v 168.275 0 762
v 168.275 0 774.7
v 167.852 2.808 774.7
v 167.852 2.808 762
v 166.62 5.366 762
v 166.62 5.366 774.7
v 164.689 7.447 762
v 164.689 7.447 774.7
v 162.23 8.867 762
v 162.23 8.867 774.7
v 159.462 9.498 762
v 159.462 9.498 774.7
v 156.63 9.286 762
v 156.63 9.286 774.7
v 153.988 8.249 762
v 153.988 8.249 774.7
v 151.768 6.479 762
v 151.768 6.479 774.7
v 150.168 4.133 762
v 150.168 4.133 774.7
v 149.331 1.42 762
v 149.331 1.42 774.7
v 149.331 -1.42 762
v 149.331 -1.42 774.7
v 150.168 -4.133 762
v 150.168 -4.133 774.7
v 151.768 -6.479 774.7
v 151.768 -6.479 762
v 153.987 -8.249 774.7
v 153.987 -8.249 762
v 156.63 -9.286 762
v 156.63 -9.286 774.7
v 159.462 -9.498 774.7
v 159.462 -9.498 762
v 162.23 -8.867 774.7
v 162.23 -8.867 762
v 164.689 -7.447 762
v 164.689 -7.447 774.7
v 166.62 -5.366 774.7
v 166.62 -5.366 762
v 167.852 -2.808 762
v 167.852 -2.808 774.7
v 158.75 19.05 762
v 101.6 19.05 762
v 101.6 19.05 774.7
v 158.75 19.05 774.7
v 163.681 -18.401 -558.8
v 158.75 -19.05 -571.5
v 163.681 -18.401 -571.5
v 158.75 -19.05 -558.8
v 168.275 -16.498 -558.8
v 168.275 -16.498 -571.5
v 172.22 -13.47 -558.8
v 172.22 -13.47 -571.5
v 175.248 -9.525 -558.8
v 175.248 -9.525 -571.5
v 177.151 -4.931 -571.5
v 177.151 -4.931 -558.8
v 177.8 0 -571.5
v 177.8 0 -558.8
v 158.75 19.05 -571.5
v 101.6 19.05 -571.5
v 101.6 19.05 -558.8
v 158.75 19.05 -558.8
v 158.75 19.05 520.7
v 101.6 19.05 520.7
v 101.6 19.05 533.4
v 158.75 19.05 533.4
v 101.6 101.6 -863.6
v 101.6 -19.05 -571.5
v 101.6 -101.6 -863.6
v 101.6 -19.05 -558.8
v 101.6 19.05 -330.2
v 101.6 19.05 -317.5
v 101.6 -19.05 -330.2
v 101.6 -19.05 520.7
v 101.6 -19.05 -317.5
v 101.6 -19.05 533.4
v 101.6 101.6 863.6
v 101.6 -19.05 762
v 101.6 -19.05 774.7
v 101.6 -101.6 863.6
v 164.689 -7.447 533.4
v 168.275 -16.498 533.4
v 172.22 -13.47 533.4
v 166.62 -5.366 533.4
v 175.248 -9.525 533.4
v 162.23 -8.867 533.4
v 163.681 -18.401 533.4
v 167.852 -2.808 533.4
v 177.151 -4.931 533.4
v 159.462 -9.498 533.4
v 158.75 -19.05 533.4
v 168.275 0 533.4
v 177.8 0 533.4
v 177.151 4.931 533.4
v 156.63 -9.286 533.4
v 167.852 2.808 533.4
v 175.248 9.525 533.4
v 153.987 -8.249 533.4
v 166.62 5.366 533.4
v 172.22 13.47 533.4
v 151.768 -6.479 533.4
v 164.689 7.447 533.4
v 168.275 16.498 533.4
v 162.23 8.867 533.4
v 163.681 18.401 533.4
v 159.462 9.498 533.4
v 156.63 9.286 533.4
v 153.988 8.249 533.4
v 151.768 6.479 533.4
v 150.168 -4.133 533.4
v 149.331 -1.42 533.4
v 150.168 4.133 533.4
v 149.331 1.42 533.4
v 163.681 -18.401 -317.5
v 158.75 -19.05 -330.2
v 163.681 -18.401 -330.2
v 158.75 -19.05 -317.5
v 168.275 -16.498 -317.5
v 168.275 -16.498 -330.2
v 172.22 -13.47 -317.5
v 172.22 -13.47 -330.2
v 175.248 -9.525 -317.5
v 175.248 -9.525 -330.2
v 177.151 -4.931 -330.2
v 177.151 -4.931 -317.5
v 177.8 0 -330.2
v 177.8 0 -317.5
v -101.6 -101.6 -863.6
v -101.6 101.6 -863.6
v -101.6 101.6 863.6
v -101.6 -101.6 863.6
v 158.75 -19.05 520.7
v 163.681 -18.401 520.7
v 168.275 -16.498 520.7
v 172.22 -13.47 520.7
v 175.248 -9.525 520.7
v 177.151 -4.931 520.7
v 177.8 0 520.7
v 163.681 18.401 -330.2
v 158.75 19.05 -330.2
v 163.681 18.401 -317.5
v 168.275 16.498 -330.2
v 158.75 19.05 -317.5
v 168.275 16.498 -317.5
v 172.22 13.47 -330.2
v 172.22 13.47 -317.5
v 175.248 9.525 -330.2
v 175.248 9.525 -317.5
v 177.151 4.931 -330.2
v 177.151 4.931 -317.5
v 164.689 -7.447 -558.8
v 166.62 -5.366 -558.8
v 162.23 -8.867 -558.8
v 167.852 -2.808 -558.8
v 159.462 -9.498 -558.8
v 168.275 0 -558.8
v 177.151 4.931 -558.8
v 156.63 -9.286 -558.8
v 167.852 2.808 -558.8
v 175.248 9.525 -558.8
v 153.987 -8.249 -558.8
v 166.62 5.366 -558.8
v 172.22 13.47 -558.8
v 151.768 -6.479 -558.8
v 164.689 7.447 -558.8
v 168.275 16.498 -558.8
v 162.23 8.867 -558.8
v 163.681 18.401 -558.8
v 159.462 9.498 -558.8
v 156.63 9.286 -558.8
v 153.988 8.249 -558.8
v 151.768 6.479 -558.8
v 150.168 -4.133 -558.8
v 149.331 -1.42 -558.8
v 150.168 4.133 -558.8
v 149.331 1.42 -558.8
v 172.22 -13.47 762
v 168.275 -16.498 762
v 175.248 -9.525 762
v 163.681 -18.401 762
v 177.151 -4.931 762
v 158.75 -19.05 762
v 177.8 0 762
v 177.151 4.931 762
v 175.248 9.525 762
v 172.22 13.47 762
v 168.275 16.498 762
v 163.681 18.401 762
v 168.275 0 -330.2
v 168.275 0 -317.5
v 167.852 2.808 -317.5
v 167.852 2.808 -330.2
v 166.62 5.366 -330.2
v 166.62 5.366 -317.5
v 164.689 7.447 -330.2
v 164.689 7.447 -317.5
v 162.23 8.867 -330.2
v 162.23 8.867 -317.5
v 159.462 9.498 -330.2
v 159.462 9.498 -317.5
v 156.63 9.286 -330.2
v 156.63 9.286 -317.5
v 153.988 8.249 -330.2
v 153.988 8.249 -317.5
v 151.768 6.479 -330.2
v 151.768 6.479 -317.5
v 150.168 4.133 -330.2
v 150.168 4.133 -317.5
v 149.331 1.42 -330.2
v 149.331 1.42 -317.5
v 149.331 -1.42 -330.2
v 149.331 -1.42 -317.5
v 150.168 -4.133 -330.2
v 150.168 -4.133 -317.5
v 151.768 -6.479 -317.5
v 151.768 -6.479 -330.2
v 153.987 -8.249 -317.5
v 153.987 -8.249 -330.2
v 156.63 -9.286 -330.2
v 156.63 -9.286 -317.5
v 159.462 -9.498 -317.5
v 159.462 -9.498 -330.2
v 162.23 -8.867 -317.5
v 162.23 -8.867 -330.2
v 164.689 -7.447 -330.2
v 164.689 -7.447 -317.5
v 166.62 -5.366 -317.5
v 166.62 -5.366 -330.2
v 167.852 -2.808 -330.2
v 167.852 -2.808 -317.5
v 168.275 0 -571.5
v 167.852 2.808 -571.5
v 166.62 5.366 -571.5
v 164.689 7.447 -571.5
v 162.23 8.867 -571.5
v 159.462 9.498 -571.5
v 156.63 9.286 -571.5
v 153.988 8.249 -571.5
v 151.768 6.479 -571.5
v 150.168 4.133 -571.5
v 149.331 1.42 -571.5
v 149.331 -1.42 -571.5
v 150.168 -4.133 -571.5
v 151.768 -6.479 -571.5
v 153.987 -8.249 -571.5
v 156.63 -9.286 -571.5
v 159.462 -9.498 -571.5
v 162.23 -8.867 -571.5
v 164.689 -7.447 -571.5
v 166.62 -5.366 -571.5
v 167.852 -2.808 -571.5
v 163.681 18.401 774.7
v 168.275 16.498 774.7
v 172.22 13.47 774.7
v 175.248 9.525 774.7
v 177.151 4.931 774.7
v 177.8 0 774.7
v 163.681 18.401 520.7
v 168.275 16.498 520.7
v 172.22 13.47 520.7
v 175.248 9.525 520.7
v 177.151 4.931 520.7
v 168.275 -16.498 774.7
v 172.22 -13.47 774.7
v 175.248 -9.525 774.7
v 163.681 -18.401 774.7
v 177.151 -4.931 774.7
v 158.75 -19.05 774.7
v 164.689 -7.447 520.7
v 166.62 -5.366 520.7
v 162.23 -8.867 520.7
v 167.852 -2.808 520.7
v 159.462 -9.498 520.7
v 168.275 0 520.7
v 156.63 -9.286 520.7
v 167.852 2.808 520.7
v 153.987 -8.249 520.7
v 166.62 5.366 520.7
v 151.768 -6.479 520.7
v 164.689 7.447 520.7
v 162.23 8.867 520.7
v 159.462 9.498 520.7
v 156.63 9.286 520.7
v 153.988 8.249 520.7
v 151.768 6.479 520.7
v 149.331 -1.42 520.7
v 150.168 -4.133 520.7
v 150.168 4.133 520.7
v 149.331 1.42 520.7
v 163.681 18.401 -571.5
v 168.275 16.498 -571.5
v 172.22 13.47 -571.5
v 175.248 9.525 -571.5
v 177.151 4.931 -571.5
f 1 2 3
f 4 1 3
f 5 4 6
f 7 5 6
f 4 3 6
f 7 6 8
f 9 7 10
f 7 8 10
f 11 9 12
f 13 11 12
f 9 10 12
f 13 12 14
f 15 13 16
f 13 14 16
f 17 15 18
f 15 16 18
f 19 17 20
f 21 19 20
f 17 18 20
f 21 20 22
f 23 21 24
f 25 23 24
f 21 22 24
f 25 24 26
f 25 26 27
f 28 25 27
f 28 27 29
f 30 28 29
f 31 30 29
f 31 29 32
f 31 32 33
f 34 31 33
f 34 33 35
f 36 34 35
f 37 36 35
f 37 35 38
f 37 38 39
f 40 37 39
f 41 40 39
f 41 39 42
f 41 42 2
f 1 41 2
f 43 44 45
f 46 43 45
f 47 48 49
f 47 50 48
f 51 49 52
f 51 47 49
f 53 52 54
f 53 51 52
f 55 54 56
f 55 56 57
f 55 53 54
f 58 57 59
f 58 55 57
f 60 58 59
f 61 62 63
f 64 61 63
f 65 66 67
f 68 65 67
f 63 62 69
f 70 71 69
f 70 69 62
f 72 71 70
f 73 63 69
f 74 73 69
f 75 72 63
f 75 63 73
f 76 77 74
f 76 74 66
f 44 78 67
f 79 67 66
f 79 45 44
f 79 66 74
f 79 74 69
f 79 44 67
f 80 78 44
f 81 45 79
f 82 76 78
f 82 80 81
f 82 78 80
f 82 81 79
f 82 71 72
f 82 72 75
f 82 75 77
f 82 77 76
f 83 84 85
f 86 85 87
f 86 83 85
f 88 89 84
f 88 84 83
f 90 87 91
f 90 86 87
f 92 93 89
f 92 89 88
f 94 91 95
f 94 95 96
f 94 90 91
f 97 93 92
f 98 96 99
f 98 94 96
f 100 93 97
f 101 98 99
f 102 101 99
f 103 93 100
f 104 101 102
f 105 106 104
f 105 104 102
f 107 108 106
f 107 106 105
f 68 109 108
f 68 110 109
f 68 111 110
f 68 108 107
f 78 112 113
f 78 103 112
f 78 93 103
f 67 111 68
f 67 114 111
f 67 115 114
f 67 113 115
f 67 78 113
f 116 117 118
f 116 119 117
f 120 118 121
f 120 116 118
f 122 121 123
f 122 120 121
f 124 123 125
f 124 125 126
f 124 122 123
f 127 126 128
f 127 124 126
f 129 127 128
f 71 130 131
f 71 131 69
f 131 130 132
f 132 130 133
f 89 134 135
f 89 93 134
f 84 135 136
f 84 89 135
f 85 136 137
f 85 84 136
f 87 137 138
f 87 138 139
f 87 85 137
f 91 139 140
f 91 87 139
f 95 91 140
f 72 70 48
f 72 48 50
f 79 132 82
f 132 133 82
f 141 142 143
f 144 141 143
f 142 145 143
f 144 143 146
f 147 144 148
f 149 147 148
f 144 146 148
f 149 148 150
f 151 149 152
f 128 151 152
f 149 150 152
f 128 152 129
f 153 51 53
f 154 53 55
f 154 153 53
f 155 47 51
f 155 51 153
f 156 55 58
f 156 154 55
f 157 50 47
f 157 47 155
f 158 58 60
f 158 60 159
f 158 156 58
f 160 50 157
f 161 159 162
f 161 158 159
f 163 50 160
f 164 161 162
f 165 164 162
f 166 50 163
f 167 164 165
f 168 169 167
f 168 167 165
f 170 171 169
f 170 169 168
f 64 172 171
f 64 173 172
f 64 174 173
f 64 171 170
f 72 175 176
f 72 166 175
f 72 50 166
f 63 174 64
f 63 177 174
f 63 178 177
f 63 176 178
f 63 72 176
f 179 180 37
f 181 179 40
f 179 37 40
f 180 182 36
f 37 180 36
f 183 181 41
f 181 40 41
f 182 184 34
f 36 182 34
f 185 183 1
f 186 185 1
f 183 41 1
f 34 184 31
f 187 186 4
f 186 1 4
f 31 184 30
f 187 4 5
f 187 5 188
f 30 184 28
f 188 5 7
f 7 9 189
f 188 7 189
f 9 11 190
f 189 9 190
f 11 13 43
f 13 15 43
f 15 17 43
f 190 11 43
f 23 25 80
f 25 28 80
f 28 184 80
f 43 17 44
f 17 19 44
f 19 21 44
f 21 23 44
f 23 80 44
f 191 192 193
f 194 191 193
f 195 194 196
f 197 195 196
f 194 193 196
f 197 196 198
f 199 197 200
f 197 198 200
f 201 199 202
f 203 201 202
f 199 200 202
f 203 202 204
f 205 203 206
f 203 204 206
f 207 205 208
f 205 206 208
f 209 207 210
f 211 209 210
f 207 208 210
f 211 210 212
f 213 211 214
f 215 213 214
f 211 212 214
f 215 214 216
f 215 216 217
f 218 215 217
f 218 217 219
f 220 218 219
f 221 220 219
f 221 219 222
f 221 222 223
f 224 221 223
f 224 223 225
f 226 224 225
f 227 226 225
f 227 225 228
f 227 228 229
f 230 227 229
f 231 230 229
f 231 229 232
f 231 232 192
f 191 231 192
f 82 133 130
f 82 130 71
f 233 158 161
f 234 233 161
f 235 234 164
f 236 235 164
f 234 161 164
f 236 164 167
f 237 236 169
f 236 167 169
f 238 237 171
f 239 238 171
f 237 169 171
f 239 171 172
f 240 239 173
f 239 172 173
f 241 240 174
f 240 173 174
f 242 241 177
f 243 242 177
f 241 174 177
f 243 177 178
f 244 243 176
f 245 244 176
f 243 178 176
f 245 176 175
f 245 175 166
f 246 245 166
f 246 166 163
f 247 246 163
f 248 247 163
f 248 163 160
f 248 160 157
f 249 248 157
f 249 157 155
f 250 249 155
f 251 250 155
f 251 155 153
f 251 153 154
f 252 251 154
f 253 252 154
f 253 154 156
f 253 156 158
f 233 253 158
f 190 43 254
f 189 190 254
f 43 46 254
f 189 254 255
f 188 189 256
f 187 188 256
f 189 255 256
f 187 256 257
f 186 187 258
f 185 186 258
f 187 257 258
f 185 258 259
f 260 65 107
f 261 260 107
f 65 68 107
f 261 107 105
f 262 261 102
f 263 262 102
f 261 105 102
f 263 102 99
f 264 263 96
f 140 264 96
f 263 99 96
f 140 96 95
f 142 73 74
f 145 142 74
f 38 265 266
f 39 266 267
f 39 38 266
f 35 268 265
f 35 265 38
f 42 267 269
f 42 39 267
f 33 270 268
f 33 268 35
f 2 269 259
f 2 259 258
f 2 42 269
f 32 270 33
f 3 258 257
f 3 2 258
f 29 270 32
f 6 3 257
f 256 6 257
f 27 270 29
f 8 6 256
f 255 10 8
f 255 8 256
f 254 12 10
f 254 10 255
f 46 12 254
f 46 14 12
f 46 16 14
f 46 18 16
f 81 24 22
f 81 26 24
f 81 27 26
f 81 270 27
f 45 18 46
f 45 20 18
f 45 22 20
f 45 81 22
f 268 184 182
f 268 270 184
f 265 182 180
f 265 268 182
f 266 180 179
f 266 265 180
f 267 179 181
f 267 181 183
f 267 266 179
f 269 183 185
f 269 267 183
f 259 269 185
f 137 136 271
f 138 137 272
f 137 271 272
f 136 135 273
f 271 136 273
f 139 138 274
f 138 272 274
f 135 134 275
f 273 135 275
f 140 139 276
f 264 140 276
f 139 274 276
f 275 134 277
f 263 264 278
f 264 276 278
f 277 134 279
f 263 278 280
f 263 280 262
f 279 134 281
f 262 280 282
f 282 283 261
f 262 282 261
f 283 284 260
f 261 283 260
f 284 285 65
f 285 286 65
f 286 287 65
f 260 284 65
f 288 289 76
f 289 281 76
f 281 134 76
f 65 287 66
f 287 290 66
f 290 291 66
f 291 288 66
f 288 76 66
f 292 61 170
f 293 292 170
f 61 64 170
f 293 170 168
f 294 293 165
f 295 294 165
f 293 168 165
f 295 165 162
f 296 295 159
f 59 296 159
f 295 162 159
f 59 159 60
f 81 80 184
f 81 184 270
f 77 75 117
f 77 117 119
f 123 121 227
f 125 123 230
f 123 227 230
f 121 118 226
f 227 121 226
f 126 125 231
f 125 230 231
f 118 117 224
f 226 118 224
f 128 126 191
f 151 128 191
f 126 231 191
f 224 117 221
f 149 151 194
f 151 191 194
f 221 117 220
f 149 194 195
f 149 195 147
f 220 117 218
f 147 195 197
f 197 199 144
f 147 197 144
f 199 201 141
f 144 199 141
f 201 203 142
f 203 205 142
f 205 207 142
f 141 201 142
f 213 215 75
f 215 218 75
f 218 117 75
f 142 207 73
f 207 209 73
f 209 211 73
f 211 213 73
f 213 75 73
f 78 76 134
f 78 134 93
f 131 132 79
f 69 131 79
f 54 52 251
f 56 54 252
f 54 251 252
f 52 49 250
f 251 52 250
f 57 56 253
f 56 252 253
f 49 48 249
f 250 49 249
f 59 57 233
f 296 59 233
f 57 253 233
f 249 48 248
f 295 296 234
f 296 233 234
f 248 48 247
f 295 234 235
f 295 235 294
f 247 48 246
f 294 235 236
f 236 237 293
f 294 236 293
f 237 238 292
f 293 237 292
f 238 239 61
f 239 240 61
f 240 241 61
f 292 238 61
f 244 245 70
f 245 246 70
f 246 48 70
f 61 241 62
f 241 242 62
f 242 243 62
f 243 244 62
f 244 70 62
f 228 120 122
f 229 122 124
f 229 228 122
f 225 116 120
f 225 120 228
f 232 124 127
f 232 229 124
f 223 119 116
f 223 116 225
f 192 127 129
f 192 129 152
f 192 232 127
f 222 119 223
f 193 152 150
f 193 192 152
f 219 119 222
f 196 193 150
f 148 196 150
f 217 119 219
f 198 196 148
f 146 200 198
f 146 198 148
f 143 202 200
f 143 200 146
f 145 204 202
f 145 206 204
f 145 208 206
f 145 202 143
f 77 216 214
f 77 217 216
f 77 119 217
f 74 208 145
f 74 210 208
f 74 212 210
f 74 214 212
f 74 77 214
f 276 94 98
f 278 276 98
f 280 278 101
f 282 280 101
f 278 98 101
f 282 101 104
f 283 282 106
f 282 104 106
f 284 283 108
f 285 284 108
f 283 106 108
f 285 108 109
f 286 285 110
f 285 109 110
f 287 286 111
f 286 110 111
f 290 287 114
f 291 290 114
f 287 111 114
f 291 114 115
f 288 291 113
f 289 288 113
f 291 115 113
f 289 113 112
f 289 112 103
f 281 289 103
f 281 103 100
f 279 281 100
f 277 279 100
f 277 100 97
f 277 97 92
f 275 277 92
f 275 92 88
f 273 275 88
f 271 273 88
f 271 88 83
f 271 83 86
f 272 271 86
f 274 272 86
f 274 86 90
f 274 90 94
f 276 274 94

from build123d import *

# Parameters (mm, degrees)
F0_W     = 203.2
F0_H     = 1727.2
F1_DEPTH = 101.6
F2_W     = 38.1
F2_H     = 12.7
F3_DEPTH = 76.2
F4_R     = 19.04999
F5_R     = 9.525
F6_DEPTH = 1638.301


# Not quite as in the source:
# - a fillet or chamfer is up to 0.001 mm smaller than in the source, because OpenCascade refuses the exact size


with BuildPart() as f1:
    # F0 (on Front) → F1 (new body, symmetric)
    with BuildSketch(Plane.XZ):
        Rectangle(F0_W, F0_H)
    extrude(amount=F1_DEPTH, both=True)

    # F2 (on face) → F3 (join)
    with BuildSketch(Plane.YZ.offset(101.6)):
        with Locations((0, -565.15)):
            Rectangle(F2_W, F2_H)
        with Locations((0, -323.85)):
            Rectangle(F2_W, F2_H)
        with Locations((0, 527.05)):
            Rectangle(F2_W, F2_H)
        with Locations((0, 768.35)):
            Rectangle(F2_W, F2_H)
    extrude(amount=F3_DEPTH)

    # F4 (radius 19.05 in the source; OpenCascade refuses exactly that, so slightly less here)
    f4_edges = [f1.edges().sort_by_distance(p)[0] for p in [
        (177.8, 19.05, -565.15),
        (177.8, -19.05, -565.15),
        (177.8, 19.05, -323.85),
        (177.8, -19.05, -323.85),
        (177.8, 19.05, 527.05),
        (177.8, -19.05, 527.05),
        (177.8, 19.05, 768.35),
        (177.8, -19.05, 768.35),
    ]]
    fillet(f4_edges, radius=F4_R)

    # F5 (on face) → F6 (cut, through all)
    with BuildSketch(Plane.XY.offset(774.7)):
        with Locations((158.75, 0)):
            Circle(F5_R)
    extrude(amount=-F6_DEPTH, mode=Mode.SUBTRACT)


solid = f1.part
